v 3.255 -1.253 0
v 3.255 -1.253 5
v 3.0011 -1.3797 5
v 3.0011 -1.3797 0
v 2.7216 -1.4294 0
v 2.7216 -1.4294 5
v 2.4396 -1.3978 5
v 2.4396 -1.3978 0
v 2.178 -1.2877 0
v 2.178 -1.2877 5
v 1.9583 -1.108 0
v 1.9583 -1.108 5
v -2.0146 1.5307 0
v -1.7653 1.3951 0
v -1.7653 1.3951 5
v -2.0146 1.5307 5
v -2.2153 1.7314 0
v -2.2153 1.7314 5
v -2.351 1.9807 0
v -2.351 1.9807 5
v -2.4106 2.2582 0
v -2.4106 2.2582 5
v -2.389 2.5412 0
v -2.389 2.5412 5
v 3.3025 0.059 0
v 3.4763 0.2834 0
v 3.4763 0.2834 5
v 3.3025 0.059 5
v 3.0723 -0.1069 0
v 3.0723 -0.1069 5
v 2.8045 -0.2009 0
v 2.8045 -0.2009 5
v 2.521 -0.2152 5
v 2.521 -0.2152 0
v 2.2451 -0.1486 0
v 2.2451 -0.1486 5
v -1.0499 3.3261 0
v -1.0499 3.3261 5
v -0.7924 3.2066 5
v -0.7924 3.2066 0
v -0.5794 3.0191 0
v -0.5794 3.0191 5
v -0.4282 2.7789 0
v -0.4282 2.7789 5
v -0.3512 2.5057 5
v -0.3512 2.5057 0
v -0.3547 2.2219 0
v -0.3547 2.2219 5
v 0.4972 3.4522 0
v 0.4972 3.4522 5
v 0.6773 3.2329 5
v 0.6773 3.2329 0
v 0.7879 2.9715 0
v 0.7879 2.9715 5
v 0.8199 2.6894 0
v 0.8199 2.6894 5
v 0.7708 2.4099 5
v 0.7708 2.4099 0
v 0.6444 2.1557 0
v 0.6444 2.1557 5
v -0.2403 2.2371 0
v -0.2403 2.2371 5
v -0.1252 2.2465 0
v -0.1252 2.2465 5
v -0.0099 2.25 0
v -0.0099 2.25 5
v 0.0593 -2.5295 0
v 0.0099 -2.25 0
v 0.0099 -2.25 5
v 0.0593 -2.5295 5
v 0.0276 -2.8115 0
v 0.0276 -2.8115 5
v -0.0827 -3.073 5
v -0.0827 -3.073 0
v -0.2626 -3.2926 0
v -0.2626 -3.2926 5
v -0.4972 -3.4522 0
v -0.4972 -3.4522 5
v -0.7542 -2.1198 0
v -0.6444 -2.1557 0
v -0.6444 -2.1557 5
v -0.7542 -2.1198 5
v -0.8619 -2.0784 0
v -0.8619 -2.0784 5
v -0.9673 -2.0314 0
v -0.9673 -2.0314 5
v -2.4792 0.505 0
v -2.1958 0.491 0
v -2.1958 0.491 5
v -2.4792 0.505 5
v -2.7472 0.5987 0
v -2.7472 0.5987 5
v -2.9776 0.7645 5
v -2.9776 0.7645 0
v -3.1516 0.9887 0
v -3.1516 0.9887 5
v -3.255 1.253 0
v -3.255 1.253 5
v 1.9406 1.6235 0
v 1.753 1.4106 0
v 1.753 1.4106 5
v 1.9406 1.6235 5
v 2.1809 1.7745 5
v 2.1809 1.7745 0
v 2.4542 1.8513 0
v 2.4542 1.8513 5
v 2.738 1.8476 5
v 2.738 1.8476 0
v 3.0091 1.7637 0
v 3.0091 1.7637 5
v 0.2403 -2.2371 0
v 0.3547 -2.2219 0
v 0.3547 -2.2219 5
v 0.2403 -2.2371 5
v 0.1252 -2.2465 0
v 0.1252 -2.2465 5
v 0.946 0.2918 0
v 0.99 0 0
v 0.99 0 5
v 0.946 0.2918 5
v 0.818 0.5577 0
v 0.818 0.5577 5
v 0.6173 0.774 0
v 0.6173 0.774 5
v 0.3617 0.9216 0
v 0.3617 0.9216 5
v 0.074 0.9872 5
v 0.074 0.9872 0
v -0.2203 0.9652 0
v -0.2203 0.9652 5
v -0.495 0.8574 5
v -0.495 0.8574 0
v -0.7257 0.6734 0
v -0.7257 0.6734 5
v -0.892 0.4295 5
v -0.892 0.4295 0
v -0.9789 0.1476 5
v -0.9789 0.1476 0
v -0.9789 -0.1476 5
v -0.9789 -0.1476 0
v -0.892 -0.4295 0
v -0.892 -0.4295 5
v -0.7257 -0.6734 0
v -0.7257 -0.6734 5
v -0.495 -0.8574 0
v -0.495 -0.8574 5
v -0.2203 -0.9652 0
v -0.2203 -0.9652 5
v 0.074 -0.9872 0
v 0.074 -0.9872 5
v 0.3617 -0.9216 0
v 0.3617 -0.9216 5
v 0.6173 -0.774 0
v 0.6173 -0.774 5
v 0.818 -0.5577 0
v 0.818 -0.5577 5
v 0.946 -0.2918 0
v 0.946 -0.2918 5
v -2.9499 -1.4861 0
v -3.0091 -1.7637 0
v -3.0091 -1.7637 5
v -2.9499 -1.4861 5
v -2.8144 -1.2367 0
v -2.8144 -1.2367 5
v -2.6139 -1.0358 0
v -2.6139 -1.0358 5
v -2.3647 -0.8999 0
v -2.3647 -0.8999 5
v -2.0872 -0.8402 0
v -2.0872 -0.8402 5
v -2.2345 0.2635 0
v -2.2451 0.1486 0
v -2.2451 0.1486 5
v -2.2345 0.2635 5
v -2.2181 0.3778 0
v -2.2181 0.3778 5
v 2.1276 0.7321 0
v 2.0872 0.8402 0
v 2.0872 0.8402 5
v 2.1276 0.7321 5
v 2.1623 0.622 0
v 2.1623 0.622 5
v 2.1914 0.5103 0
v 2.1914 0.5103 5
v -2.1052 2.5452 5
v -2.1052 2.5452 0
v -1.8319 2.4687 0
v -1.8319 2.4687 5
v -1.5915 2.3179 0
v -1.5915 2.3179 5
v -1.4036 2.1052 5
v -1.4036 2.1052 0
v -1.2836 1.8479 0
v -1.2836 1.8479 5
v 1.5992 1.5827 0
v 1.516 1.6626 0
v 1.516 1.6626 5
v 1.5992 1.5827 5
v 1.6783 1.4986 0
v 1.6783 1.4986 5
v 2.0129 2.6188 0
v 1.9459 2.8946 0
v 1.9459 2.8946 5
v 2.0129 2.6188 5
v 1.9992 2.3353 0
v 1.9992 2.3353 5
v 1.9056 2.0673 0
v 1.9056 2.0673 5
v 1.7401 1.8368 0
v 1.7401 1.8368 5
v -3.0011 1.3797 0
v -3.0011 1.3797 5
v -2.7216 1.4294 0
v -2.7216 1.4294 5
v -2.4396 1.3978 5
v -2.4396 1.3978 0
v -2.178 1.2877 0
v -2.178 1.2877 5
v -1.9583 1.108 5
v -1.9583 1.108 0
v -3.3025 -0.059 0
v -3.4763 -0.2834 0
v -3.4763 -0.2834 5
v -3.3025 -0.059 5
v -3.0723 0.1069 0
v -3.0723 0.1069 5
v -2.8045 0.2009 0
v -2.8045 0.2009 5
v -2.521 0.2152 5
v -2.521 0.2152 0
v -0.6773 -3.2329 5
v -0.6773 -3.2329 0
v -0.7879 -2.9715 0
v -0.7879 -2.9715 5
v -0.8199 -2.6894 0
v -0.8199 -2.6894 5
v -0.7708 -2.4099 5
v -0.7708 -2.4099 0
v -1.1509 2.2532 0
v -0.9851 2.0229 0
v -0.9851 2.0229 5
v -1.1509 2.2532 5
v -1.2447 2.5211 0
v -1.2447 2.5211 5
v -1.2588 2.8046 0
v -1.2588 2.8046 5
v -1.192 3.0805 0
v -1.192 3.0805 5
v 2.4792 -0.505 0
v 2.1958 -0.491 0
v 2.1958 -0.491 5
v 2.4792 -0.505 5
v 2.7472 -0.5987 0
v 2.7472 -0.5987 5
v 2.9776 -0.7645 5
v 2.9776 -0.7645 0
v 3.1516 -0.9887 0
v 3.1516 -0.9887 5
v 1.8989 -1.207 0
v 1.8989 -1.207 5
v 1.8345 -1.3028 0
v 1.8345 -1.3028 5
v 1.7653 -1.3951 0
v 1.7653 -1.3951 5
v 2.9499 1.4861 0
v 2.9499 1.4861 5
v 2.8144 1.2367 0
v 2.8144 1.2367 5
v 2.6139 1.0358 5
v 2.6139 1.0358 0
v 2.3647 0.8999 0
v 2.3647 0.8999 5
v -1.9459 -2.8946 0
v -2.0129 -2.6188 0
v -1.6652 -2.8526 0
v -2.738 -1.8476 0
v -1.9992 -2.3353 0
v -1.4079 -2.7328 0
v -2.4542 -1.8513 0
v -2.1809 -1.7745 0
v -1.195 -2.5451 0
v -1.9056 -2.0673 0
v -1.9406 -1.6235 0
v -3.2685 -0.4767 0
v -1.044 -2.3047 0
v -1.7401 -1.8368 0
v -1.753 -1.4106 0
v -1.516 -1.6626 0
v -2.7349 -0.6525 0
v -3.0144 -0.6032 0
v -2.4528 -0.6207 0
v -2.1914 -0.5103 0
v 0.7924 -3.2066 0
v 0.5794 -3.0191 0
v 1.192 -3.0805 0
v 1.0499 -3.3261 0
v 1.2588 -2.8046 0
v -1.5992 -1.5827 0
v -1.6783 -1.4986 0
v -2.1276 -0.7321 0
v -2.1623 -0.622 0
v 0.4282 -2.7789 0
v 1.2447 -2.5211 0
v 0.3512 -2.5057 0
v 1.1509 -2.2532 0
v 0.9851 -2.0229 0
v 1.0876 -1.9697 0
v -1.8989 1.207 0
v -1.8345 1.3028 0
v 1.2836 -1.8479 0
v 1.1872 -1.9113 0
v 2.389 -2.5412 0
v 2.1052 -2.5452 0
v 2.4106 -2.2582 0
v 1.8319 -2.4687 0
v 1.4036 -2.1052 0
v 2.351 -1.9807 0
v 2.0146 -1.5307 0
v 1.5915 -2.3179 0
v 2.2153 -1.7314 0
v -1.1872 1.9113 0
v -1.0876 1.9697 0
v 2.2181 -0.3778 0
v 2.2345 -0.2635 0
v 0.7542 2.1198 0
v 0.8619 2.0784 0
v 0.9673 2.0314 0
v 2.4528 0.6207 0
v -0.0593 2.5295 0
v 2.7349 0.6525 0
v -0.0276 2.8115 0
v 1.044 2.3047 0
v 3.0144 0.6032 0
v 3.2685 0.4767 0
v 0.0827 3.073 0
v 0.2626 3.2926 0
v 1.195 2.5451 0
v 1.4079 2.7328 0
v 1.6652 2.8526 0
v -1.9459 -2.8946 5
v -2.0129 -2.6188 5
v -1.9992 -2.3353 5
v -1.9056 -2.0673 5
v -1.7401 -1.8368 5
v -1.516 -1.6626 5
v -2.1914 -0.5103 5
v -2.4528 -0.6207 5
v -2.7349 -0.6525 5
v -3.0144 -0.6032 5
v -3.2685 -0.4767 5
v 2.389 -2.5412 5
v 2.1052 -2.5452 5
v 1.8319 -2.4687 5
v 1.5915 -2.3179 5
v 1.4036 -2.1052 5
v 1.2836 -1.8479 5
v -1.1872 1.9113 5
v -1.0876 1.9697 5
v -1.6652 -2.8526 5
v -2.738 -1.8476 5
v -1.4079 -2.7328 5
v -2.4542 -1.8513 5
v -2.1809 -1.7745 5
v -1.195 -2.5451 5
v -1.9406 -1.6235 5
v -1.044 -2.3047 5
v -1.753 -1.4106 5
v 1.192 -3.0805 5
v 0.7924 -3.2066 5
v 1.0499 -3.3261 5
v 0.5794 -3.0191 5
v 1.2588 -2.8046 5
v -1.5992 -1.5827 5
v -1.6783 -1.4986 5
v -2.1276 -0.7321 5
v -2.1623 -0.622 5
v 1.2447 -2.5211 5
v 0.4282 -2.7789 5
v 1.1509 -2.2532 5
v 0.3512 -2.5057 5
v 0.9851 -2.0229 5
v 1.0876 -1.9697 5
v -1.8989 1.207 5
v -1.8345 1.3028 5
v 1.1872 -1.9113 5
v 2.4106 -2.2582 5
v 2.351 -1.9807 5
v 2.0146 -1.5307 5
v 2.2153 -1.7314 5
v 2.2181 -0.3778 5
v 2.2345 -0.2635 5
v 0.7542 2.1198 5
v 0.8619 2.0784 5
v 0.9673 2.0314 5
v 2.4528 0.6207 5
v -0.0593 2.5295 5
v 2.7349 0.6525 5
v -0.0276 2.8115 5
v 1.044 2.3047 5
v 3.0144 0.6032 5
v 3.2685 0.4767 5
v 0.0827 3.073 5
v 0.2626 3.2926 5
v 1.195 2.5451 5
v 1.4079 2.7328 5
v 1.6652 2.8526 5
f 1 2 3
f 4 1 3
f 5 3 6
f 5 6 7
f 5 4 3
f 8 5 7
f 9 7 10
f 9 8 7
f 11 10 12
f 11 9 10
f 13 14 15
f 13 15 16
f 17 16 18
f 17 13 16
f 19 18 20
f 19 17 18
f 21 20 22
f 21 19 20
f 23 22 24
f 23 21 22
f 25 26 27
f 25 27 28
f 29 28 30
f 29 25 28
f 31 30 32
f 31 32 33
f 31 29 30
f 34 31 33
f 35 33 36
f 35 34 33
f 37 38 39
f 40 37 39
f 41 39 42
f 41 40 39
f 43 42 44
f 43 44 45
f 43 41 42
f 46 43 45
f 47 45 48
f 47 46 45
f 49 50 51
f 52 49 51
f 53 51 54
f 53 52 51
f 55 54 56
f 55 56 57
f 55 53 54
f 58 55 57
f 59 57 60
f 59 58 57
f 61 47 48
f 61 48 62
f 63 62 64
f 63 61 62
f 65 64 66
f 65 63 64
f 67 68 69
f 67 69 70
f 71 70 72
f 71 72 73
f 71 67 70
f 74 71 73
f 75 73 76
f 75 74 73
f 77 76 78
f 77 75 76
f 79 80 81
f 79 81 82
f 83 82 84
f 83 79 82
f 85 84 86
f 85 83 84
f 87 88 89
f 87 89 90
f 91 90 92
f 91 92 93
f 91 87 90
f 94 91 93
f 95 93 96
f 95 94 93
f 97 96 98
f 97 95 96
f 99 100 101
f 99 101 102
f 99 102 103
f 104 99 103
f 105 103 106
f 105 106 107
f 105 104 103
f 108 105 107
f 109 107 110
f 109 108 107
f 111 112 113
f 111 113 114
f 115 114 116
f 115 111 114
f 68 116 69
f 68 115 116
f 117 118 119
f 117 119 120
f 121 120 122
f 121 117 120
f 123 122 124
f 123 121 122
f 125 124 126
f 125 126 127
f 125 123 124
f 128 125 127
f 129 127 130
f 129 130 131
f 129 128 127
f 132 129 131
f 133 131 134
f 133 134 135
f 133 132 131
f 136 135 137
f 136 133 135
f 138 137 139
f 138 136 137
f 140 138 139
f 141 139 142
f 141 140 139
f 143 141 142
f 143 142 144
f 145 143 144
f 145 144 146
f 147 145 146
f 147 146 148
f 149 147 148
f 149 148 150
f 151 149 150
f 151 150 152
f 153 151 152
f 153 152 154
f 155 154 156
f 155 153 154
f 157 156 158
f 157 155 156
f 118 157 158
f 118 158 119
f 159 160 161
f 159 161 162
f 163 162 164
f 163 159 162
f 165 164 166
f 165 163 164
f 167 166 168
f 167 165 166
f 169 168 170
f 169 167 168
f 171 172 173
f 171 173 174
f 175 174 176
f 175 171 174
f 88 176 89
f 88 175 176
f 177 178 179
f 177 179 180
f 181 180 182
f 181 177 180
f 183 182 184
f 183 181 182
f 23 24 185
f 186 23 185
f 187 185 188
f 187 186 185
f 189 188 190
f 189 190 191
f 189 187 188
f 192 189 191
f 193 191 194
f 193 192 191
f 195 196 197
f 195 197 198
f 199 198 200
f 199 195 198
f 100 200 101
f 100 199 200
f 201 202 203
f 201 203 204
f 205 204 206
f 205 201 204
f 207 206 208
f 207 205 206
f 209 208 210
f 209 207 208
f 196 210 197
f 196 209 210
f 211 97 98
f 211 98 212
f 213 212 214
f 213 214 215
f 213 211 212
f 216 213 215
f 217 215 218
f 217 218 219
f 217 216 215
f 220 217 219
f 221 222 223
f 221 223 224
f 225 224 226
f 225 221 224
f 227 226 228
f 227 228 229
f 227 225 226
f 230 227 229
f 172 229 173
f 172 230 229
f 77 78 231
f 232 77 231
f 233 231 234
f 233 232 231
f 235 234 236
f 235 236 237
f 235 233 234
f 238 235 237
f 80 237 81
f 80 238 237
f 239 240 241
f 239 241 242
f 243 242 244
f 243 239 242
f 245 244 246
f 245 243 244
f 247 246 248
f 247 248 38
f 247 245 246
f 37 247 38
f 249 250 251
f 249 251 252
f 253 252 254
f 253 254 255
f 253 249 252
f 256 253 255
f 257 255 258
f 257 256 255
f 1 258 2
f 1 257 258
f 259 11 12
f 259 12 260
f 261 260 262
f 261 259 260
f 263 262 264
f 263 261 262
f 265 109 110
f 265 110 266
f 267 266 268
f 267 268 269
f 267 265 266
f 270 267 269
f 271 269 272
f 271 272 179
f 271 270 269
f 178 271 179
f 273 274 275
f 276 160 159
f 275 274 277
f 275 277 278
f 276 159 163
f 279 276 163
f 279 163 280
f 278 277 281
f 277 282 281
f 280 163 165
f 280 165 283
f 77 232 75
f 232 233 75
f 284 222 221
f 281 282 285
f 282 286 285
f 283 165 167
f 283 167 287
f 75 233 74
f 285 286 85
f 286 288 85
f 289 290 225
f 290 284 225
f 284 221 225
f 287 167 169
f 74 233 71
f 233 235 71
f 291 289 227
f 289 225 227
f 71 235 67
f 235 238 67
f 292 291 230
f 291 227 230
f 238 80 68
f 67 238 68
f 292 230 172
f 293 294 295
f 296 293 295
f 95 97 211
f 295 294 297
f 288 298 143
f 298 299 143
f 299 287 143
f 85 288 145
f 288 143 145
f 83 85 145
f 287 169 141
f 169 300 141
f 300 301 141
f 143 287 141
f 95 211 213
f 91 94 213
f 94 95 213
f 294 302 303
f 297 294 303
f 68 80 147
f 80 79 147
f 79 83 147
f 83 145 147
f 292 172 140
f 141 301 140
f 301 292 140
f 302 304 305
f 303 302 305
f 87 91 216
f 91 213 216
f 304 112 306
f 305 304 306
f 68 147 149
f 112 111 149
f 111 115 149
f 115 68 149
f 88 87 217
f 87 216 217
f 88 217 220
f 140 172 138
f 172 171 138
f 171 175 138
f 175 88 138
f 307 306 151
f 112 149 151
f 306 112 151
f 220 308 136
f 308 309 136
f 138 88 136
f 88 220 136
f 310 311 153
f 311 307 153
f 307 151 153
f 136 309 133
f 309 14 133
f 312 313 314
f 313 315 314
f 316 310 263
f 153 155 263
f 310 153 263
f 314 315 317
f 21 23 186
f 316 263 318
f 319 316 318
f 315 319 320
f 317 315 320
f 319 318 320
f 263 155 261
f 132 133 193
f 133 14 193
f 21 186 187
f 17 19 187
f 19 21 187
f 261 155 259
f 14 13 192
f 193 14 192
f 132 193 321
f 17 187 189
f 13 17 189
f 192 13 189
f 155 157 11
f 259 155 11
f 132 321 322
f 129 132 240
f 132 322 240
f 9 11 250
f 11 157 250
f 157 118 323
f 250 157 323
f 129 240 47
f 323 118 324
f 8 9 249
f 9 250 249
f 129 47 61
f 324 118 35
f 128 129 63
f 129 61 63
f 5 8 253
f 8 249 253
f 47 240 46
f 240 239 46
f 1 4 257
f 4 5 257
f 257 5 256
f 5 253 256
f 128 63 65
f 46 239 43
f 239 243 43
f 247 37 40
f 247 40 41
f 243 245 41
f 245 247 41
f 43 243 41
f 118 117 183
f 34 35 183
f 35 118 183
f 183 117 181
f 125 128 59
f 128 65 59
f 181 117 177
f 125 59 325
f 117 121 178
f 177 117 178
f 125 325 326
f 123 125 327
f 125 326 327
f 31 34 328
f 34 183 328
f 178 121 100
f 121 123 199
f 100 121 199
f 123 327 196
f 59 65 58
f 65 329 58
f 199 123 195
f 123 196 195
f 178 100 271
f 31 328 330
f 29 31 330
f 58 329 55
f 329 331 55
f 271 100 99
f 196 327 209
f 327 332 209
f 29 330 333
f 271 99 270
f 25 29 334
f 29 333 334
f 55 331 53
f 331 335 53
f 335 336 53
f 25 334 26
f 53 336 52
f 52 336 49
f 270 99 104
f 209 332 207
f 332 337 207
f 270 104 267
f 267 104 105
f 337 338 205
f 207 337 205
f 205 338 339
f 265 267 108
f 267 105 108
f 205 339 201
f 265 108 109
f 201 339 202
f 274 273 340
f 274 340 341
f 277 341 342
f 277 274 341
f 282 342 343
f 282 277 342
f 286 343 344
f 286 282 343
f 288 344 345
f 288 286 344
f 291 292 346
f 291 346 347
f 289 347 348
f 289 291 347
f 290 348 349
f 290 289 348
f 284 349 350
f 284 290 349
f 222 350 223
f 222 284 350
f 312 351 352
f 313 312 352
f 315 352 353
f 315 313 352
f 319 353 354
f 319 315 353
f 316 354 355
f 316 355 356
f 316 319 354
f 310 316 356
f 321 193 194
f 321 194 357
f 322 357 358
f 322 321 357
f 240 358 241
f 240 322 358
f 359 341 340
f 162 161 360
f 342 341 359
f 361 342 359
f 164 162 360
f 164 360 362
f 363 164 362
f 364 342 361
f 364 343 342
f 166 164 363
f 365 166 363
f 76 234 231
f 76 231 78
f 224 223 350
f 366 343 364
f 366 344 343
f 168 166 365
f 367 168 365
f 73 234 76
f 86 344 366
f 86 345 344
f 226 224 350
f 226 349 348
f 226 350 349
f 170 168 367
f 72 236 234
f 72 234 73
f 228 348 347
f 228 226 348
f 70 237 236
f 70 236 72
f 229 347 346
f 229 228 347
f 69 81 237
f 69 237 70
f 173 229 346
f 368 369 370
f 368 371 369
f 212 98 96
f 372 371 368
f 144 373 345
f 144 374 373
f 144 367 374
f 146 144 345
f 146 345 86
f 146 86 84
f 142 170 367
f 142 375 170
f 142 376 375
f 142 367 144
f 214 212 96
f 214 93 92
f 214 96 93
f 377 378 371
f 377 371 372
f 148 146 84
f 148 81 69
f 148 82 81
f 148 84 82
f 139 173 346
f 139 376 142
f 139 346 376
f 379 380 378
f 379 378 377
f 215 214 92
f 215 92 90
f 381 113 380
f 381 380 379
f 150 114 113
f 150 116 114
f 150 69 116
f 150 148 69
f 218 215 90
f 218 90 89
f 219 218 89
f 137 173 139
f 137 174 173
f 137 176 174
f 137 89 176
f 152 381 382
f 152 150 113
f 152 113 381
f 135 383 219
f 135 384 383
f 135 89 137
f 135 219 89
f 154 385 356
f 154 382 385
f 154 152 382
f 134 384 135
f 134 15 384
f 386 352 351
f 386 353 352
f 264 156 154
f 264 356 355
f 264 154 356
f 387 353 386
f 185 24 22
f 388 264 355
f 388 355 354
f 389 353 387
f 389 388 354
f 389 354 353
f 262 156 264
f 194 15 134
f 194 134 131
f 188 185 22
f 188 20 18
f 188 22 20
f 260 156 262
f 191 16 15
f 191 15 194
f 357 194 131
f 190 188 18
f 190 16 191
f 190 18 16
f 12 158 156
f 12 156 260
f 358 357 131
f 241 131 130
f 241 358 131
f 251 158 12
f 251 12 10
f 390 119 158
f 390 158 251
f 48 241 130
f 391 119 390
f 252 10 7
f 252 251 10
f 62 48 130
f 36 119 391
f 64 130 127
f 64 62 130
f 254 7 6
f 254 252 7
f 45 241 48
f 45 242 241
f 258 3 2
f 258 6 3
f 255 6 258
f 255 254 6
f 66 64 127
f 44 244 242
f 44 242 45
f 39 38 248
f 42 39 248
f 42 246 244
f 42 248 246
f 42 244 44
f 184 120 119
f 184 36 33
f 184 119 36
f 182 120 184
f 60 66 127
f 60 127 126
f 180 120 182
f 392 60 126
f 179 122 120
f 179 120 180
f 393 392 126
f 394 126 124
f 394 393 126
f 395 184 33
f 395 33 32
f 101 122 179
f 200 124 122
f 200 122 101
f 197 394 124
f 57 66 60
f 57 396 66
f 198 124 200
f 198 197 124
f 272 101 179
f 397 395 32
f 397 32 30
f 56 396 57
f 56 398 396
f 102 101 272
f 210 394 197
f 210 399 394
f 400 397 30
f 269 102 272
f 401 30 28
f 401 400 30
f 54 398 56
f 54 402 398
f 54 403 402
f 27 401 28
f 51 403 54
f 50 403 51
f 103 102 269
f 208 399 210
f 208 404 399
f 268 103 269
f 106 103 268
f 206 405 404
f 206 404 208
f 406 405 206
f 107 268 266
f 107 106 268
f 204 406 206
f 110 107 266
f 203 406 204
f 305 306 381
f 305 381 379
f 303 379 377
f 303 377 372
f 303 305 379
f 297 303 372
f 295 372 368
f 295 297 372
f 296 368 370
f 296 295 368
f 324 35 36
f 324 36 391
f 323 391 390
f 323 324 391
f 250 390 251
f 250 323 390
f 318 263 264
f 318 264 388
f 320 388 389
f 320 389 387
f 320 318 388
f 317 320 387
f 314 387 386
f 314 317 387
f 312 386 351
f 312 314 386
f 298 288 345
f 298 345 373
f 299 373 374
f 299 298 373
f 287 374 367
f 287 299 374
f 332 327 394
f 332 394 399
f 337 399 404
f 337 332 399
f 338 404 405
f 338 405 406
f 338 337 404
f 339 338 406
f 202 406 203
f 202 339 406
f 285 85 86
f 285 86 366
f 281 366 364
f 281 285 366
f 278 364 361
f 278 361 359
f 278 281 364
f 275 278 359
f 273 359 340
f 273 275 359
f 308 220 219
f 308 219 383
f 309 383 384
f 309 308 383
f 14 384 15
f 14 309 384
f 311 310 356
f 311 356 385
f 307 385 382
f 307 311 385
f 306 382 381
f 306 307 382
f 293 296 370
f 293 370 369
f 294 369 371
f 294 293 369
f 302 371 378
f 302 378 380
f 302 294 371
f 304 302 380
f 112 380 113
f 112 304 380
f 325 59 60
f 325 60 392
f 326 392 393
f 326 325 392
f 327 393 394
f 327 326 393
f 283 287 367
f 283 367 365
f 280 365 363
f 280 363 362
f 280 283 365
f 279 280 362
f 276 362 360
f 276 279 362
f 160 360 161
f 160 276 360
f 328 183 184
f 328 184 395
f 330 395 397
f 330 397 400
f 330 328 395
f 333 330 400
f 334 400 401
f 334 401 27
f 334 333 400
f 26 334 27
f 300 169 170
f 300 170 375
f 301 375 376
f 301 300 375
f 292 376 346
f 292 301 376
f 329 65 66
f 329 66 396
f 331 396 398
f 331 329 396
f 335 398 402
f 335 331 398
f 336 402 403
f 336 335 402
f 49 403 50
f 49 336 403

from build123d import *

# Parameters (mm, degrees)
CROQUIS1_R              = 3.5
CROQUIS1_R_2            = 0.99
SALIENTE_EXTRUIR1_DEPTH = 5
CORTAR_EXTRUIR1_START   = -5
CORTAR_EXTRUIR1_DEPTH   = 5
MATRIZC1_COUNT          = 14


with BuildPart() as part:
    # Croquis1 → Saliente-Extruir1 (new body)
    with BuildSketch(Plane.XY):
        Circle(CROQUIS1_R)
        Circle(CROQUIS1_R_2, mode=Mode.SUBTRACT)
    extrude(amount=SALIENTE_EXTRUIR1_DEPTH)

    # Croquis2 → Cortar-Extruir1 (cut)
    with BuildSketch(Plane.XY.offset(5).offset(CORTAR_EXTRUIR1_START)):
        with BuildLine():
            ThreePointArc((0.516991774, 3.461606492), (-0.284402129, 3.488425924), (-1.070868948, 3.332152412))
            ThreePointArc((-1.070868948, 3.332152412), (-0.501013204, 2.913608412), (-0.354709173, 2.221864398))
            ThreePointArc((-0.354709173, 2.221864398), (-0.18282994, 2.242559523), (-0.009868326, 2.249978359))
            ThreePointArc((-0.009868326, 2.249978359), (0.022456296, 2.956285494), (0.516991774, 3.461606492))
        make_face()
    cortar_extruir1 = extrude(amount=CORTAR_EXTRUIR1_DEPTH, mode=Mode.SUBTRACT)

    # MatrizC1: Cortar-Extruir1 ×14 about axis
    matrizc1_axis = Axis((0, 0, 0), (0, 0, 1))
    for i in range(1, MATRIZC1_COUNT):
        add(cortar_extruir1.rotate(matrizc1_axis, i * 360 / MATRIZC1_COUNT), mode=Mode.SUBTRACT)


solid = part.part
